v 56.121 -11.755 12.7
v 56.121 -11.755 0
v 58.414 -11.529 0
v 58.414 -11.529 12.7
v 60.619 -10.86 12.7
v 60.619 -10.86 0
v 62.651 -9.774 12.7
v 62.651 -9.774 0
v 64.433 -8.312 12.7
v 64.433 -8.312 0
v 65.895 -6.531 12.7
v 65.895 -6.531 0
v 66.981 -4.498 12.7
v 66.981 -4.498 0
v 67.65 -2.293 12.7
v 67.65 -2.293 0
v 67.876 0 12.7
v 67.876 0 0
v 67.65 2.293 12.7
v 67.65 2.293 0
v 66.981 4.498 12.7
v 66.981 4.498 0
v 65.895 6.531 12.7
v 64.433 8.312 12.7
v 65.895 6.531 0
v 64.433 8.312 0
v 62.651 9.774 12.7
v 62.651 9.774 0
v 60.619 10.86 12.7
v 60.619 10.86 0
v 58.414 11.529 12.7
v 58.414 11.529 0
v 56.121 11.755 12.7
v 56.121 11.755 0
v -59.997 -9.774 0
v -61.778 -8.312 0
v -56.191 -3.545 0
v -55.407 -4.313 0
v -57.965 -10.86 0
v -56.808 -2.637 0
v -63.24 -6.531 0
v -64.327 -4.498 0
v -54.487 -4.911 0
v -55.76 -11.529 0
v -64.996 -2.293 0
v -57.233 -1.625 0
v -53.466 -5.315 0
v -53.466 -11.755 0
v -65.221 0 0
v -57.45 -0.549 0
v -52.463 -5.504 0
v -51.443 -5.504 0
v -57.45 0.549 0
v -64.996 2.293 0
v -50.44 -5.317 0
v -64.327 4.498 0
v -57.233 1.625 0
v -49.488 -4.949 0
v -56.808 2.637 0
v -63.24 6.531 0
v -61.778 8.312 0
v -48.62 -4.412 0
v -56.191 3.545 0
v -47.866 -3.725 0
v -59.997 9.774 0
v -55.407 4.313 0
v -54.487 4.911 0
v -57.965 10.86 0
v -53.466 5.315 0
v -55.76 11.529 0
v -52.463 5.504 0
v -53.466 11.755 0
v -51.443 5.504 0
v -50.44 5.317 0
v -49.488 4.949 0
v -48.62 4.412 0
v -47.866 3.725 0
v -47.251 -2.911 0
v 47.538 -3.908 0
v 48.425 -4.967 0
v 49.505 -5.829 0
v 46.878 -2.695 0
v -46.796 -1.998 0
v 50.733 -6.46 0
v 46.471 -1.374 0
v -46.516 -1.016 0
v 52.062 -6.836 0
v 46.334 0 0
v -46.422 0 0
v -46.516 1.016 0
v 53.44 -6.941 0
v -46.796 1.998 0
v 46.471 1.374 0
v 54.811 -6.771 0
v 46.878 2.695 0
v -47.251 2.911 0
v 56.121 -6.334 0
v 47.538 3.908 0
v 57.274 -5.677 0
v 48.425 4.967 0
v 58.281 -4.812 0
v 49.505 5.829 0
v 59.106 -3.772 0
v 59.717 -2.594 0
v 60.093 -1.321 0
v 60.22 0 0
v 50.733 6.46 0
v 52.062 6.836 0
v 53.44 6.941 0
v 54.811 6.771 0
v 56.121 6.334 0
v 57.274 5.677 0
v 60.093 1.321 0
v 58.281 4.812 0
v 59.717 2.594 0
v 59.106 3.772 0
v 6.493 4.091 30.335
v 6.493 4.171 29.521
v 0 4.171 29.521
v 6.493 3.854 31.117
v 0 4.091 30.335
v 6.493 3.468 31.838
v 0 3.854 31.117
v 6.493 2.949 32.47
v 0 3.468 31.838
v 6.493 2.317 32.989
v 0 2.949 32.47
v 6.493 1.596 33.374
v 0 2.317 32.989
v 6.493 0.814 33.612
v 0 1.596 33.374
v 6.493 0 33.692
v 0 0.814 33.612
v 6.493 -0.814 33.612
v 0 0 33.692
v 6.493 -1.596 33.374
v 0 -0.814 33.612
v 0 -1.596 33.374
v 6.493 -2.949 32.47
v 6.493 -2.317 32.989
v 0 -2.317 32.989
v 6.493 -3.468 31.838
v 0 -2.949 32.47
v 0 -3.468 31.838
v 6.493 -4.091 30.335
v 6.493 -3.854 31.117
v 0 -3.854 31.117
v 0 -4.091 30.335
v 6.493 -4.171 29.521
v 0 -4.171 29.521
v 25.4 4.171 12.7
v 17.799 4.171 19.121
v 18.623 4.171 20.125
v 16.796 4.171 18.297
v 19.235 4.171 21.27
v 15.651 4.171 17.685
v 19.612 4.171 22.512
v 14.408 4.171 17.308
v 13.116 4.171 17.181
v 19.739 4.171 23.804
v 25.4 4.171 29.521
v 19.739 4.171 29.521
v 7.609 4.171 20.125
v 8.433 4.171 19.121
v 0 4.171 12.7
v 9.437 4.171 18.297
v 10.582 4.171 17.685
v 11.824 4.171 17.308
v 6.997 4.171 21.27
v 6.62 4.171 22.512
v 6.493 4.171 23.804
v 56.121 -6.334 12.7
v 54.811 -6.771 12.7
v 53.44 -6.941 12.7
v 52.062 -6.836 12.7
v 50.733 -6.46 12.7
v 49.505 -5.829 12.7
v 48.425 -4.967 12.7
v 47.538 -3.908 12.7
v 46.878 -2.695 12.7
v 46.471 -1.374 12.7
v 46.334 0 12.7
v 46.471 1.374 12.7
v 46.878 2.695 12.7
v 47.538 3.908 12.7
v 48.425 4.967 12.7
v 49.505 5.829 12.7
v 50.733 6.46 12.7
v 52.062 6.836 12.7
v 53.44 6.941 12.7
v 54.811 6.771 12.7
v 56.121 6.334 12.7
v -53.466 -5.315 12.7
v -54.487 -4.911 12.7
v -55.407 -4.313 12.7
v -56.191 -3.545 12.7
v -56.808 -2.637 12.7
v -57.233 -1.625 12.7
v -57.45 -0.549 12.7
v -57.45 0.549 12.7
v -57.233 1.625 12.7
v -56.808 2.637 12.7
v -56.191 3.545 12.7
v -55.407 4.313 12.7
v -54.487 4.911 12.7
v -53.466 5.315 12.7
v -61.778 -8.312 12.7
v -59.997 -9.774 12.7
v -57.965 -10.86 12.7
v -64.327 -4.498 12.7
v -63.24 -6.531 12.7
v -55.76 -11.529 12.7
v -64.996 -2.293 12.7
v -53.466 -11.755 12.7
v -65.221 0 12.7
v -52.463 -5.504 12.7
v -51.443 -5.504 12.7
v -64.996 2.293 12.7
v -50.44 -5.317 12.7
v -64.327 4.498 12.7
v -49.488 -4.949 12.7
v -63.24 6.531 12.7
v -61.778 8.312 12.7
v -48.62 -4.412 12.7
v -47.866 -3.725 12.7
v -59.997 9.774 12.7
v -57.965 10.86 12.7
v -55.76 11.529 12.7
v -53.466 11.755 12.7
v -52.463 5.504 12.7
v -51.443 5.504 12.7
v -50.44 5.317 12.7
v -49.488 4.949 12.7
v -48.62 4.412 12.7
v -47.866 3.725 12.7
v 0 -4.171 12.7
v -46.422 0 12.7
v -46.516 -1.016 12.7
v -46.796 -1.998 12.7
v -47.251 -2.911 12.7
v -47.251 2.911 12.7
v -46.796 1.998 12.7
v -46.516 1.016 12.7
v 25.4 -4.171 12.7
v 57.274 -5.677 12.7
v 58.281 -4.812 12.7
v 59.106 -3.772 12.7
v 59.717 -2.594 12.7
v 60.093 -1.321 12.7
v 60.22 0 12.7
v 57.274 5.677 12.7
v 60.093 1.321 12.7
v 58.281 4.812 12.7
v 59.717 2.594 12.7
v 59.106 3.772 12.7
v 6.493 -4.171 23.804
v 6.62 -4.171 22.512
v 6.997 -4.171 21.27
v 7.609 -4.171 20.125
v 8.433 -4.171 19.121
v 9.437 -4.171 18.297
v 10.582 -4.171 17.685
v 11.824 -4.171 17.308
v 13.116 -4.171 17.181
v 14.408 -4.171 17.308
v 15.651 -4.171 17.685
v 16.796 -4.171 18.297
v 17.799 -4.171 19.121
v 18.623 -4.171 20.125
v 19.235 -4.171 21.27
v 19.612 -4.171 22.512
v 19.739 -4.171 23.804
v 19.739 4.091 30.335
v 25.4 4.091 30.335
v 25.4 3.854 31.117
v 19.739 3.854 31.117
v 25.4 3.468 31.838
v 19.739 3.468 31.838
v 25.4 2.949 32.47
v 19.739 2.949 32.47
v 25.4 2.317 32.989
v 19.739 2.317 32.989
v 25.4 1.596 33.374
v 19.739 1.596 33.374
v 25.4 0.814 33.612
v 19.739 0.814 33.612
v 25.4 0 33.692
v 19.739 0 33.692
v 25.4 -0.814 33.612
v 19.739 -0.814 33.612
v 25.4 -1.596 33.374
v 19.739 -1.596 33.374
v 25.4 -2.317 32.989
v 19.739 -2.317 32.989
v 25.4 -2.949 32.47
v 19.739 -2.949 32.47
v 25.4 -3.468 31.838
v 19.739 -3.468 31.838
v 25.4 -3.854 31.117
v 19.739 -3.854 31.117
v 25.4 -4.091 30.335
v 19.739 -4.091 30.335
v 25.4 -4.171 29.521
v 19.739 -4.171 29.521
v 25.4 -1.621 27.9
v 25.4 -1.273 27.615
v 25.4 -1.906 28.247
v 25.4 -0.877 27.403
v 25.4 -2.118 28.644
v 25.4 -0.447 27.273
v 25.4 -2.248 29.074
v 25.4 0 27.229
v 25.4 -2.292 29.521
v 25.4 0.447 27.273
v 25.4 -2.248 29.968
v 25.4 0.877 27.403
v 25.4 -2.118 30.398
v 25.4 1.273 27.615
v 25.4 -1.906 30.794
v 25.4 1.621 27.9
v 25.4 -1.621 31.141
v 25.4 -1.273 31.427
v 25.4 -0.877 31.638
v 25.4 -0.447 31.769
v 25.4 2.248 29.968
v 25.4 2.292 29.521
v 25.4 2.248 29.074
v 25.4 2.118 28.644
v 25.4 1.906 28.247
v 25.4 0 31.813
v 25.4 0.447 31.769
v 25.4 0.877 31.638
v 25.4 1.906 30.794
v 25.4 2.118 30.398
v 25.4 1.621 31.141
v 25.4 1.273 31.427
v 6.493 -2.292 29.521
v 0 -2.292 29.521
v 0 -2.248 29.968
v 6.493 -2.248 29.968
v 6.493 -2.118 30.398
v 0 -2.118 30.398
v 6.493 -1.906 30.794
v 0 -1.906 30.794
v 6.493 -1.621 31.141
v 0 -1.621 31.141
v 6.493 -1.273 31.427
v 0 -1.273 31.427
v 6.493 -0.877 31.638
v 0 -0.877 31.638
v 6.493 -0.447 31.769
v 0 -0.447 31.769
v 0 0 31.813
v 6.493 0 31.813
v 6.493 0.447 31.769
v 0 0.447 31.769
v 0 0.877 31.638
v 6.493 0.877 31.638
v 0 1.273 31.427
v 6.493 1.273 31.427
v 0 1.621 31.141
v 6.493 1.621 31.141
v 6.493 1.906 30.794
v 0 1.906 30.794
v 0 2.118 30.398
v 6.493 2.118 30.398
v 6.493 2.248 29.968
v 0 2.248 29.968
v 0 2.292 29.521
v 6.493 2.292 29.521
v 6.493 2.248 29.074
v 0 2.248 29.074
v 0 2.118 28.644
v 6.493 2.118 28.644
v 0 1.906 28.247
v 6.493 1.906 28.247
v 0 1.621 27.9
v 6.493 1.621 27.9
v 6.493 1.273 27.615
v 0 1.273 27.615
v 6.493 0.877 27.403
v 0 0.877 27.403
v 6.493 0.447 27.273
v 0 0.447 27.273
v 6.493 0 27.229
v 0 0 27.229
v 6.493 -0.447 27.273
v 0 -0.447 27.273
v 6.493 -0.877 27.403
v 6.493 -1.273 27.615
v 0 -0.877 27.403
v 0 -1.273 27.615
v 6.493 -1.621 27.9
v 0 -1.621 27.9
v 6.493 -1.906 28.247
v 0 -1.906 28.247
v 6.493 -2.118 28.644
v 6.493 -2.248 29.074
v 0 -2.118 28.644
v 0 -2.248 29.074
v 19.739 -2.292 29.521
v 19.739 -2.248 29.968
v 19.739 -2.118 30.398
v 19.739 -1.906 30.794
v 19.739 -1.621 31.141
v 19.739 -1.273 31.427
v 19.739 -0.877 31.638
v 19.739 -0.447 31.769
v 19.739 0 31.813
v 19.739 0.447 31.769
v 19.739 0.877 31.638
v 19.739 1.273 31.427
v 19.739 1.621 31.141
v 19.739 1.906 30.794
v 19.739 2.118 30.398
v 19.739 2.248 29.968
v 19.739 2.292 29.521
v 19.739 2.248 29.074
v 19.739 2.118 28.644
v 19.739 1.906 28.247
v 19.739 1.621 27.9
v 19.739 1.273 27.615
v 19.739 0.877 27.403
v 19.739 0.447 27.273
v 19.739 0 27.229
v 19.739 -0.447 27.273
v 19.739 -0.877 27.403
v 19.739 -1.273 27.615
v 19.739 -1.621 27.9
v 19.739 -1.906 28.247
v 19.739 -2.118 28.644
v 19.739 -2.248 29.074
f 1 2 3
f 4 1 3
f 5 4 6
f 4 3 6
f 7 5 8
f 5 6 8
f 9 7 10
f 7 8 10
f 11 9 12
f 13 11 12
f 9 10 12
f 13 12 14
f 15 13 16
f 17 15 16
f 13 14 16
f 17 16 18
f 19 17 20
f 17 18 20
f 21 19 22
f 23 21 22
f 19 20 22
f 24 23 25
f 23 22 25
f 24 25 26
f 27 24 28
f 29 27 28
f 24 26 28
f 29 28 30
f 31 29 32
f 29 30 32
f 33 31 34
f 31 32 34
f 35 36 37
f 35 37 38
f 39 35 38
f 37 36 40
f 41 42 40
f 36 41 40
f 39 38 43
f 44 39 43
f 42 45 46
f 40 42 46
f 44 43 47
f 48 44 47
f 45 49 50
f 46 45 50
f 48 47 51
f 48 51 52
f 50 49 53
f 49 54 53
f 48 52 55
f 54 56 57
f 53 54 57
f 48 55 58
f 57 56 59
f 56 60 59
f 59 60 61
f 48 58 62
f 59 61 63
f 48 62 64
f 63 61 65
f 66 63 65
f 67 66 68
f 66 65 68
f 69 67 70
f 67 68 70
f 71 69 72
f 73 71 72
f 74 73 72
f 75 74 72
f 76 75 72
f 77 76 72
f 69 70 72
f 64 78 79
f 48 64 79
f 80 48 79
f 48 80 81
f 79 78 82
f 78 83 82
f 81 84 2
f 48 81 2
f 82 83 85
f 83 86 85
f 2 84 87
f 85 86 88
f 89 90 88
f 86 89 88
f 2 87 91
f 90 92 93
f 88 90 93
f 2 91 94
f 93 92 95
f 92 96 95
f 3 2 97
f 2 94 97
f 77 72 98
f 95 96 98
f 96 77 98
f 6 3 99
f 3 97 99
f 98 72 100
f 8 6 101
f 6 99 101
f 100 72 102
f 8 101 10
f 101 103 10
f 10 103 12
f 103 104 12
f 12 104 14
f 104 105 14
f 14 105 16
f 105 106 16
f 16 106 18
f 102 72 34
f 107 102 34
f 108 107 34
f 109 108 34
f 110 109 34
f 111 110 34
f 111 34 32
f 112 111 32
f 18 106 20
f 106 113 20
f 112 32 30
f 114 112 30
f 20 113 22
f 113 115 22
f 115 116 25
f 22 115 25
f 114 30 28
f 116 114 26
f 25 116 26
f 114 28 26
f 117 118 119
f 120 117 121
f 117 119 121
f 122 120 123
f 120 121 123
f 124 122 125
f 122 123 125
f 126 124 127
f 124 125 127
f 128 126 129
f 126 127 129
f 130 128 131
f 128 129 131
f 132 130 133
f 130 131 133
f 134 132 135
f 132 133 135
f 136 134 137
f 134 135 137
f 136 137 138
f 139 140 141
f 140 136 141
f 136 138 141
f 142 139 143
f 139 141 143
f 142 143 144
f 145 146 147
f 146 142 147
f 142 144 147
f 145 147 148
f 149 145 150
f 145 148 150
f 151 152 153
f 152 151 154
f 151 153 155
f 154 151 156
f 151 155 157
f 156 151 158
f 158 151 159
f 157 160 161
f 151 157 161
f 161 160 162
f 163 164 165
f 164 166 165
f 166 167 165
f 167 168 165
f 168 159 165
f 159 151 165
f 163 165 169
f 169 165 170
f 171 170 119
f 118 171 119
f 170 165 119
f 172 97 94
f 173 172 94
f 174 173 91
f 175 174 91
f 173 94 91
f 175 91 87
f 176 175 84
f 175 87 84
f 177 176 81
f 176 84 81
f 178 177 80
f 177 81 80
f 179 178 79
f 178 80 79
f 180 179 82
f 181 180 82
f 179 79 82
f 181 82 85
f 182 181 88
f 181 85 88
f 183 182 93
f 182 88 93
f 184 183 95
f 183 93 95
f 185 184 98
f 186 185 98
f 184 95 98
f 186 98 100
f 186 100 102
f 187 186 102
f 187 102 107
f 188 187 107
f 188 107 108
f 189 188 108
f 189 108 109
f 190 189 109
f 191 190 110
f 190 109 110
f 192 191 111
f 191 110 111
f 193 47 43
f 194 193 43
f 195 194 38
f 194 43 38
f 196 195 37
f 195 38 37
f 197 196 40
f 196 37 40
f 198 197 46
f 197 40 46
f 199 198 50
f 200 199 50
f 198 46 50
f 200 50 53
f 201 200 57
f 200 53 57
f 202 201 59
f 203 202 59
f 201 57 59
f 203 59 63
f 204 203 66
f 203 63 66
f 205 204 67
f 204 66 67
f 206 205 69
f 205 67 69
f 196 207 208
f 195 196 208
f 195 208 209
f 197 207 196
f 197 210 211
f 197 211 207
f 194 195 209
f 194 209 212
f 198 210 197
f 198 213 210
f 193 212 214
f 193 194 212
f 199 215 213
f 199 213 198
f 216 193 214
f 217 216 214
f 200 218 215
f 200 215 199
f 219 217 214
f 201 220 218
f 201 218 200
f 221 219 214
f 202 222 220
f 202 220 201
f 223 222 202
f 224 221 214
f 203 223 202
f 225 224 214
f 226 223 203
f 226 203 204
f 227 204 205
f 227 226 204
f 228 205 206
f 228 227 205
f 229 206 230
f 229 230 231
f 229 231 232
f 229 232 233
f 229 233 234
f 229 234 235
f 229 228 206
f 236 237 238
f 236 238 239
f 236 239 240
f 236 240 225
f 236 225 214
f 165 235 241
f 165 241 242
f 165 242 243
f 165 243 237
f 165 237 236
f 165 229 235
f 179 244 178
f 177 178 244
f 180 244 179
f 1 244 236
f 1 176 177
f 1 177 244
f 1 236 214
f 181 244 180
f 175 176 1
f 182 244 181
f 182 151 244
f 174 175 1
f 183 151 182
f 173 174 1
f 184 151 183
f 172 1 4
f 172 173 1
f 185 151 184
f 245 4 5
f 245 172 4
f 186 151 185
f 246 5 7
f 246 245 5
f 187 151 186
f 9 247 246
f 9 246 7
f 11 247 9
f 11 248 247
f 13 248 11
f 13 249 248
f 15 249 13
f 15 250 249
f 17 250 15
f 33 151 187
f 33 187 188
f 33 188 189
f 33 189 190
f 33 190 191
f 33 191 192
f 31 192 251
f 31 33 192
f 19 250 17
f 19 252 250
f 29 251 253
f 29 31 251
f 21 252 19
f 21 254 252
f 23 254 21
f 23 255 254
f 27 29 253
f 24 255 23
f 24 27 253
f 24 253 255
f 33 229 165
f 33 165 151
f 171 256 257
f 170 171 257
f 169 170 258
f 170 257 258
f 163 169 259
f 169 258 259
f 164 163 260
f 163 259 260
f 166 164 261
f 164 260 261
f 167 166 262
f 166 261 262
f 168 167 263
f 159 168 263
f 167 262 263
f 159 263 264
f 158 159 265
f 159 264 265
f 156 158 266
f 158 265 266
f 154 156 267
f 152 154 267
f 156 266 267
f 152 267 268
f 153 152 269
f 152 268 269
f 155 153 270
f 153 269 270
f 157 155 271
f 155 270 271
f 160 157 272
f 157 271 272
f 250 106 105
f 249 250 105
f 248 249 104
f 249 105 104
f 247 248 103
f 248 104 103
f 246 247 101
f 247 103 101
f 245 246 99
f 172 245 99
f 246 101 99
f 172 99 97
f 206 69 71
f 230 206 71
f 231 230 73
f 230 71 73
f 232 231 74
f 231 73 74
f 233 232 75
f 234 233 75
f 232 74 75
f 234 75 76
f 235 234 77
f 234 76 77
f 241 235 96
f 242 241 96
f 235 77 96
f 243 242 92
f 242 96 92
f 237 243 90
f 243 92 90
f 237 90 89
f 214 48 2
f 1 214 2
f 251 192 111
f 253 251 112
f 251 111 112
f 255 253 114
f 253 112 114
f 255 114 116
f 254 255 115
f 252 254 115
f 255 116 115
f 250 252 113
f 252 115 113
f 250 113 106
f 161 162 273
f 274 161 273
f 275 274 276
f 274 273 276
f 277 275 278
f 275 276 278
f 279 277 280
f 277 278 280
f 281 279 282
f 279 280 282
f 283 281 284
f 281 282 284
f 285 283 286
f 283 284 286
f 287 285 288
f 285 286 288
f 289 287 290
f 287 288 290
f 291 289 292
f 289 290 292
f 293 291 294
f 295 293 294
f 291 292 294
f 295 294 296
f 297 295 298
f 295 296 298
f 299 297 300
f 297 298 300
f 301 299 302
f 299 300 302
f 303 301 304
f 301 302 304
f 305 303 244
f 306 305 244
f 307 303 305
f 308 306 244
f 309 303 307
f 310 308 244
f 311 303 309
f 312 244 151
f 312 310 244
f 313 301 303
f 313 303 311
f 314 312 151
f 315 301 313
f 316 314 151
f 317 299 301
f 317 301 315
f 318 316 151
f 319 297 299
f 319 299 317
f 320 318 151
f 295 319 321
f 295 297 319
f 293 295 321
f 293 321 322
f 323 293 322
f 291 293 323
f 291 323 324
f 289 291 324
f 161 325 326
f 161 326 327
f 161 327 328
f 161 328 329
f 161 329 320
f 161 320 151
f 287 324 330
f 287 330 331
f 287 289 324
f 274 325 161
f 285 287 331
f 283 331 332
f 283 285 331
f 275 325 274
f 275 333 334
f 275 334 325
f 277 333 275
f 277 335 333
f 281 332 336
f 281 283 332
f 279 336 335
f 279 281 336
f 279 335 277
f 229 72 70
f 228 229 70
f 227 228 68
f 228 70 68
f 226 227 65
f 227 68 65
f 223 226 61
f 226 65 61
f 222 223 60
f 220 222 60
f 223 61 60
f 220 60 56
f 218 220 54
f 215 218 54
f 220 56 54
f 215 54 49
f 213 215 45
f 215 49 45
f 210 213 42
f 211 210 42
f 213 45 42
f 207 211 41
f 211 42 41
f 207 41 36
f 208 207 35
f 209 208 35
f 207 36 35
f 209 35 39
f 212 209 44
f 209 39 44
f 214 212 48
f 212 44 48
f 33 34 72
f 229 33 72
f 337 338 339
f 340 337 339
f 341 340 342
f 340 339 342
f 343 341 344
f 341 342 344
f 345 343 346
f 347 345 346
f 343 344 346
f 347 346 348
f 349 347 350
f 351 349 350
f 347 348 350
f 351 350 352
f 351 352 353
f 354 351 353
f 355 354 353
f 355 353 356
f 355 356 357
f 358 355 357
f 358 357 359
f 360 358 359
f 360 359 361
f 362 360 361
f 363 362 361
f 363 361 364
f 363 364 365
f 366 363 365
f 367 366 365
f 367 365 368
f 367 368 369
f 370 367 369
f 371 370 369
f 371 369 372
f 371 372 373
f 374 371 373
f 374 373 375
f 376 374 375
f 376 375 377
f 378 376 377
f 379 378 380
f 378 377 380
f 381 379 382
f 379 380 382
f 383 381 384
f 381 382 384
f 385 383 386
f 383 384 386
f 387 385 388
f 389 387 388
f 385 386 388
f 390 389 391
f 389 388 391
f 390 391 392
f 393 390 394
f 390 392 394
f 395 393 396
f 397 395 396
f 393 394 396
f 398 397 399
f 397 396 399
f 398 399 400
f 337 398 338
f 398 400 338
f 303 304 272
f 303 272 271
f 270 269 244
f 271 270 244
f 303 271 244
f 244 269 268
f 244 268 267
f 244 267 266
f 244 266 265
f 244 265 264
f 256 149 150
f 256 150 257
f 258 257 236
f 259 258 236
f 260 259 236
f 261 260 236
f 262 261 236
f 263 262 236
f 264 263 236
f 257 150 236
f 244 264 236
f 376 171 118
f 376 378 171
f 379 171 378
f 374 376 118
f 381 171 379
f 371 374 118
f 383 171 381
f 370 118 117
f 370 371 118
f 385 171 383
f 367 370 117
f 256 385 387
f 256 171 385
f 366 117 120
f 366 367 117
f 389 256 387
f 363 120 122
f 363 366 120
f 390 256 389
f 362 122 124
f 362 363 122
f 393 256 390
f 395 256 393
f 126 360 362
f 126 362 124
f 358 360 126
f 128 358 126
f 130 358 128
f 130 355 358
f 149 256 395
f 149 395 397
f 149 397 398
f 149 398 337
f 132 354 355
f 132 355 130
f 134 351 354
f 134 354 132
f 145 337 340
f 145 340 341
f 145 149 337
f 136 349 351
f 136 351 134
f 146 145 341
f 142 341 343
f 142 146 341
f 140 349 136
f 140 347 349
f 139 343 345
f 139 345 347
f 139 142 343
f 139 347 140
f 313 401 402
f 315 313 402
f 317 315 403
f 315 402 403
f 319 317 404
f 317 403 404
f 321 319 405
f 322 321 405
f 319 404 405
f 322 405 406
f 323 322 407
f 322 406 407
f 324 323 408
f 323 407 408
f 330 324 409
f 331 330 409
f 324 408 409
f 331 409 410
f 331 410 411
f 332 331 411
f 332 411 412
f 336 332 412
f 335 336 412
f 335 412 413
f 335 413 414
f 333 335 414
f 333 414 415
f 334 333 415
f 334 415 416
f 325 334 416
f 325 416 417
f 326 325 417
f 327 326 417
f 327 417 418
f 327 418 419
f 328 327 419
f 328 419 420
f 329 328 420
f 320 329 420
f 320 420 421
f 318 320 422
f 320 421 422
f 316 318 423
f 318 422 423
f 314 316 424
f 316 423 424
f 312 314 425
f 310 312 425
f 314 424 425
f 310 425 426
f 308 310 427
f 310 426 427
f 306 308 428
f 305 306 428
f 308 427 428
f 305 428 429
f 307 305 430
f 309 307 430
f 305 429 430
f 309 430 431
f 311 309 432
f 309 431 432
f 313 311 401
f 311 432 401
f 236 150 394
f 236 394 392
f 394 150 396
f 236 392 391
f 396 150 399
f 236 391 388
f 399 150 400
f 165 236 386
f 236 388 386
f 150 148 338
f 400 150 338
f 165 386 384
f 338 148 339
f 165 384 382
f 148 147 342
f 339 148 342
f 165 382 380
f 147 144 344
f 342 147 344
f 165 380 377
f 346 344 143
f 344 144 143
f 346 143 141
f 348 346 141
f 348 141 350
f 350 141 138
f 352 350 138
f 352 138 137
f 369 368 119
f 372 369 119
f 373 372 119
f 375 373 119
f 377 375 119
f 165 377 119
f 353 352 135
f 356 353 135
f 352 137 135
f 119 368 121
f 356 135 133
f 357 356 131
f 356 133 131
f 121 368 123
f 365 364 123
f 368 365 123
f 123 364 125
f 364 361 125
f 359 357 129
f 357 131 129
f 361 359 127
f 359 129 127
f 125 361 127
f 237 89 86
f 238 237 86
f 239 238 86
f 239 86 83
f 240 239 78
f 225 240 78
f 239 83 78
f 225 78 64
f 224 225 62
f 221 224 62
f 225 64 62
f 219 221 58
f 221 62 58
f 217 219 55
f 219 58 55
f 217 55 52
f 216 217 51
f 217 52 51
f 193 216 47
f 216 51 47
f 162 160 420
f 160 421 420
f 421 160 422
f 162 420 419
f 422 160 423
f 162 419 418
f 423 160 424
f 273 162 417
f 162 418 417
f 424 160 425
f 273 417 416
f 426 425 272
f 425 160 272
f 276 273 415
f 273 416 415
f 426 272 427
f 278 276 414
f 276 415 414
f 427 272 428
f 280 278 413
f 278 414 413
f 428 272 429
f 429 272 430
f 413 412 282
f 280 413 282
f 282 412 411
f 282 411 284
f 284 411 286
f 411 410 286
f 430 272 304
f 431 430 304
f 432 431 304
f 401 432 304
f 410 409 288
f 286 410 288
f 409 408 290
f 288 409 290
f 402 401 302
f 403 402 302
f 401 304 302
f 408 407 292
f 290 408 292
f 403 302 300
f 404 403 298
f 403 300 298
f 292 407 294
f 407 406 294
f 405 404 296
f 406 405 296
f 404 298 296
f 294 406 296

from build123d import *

# Parameters (mm, degrees)
F1_DEPTH = 12.7
F3_DEPTH = 25.4
F4_W     = 13.24638
F4_H     = 9.920692
F5_DEPTH = 15.927161


with BuildPart() as f1:
    # F0 (on Top) → F1 (new body)
    with BuildSketch(Plane.XY):
        with BuildLine():
            Line((-53.466398, -11.755024), (56.120757, -11.755024))
            Line((56.120757, -11.755024), (56.120757, -6.333794))
            ThreePointArc((56.120757, -6.333794), (46.333815, 0), (56.120757, 6.333794))
            Line((56.120757, 6.333794), (56.120757, 11.755024))
            Line((56.120757, 11.755024), (-53.466398, 11.755024))
            Line((-53.466398, 11.755024), (-53.466398, 5.315492))
            ThreePointArc((-53.466398, 5.315492), (-48.620146, 4.412441), (-46.421961, 0))
            ThreePointArc((-46.421961, 0), (-48.620146, -4.412441), (-53.466398, -5.315492))
            Line((-53.466398, -5.315492), (-53.466398, -11.755024))
        make_face()
        with BuildLine():
            Line((56.120757, -6.333794), (56.120757, -11.755024))
            ThreePointArc((56.120757, -11.755024), (67.875781, 0), (56.120757, 11.755024))
            Line((56.120757, 11.755024), (56.120757, 6.333794))
            ThreePointArc((56.120757, 6.333794), (59.105633, 3.772233), (60.219784, 0))
            ThreePointArc((60.219784, 0), (59.105633, -3.772233), (56.120757, -6.333794))
        make_face()
        with BuildLine():
            ThreePointArc((-53.466398, 11.755024), (-65.221422, 0), (-53.466398, -11.755024))
            Line((-53.466398, -11.755024), (-53.466398, -5.315492))
            ThreePointArc((-53.466398, -5.315492), (-57.477287, 0), (-53.466398, 5.315492))
            Line((-53.466398, 5.315492), (-53.466398, 11.755024))
        make_face()
    extrude(amount=F1_DEPTH)

    # F2 (on Right) → F3 (join)
    with BuildSketch(Plane.YZ):
        with BuildLine():
            Line((-4.171137, 29.520769), (-4.171137, 11.186233))
            Line((-4.171137, 11.186233), (4.171137, 11.186233))
            Line((4.171137, 11.186233), (4.171137, 29.520769))
            ThreePointArc((4.171137, 29.520769), (0, 25.349631), (-4.171137, 29.520769))
        make_face()
        with BuildLine():
            ThreePointArc((4.171137, 29.520769), (0, 33.691906), (-4.171137, 29.520769))
            Line((-4.171137, 29.520769), (-2.292054, 29.520769))
            ThreePointArc((-2.292054, 29.520769), (0, 31.812823), (2.292054, 29.520769))
            Line((2.292054, 29.520769), (4.171137, 29.520769))
        make_face()
        with BuildLine():
            Line((-2.292054, 29.520769), (-4.171137, 29.520769))
            ThreePointArc((-4.171137, 29.520769), (0, 25.349631), (4.171137, 29.520769))
            Line((4.171137, 29.520769), (2.292054, 29.520769))
            ThreePointArc((2.292054, 29.520769), (0, 27.228715), (-2.292054, 29.520769))
        make_face()
    extrude(amount=F3_DEPTH)

    # F4 (on face) → F5 (cut, through all)
    with BuildSketch(Plane.XZ.offset(4.171137)):
        with Locations((13.116183, 28.764711)):
            Rectangle(F4_W, F4_H)
        with BuildLine():
            Line((19.739373, 23.804365), (6.492993, 23.804365))
            ThreePointArc((6.492993, 23.804365), (13.116183, 17.181175), (19.739373, 23.804365))
        make_face()
    extrude(amount=-F5_DEPTH, mode=Mode.SUBTRACT)


solid = f1.part
